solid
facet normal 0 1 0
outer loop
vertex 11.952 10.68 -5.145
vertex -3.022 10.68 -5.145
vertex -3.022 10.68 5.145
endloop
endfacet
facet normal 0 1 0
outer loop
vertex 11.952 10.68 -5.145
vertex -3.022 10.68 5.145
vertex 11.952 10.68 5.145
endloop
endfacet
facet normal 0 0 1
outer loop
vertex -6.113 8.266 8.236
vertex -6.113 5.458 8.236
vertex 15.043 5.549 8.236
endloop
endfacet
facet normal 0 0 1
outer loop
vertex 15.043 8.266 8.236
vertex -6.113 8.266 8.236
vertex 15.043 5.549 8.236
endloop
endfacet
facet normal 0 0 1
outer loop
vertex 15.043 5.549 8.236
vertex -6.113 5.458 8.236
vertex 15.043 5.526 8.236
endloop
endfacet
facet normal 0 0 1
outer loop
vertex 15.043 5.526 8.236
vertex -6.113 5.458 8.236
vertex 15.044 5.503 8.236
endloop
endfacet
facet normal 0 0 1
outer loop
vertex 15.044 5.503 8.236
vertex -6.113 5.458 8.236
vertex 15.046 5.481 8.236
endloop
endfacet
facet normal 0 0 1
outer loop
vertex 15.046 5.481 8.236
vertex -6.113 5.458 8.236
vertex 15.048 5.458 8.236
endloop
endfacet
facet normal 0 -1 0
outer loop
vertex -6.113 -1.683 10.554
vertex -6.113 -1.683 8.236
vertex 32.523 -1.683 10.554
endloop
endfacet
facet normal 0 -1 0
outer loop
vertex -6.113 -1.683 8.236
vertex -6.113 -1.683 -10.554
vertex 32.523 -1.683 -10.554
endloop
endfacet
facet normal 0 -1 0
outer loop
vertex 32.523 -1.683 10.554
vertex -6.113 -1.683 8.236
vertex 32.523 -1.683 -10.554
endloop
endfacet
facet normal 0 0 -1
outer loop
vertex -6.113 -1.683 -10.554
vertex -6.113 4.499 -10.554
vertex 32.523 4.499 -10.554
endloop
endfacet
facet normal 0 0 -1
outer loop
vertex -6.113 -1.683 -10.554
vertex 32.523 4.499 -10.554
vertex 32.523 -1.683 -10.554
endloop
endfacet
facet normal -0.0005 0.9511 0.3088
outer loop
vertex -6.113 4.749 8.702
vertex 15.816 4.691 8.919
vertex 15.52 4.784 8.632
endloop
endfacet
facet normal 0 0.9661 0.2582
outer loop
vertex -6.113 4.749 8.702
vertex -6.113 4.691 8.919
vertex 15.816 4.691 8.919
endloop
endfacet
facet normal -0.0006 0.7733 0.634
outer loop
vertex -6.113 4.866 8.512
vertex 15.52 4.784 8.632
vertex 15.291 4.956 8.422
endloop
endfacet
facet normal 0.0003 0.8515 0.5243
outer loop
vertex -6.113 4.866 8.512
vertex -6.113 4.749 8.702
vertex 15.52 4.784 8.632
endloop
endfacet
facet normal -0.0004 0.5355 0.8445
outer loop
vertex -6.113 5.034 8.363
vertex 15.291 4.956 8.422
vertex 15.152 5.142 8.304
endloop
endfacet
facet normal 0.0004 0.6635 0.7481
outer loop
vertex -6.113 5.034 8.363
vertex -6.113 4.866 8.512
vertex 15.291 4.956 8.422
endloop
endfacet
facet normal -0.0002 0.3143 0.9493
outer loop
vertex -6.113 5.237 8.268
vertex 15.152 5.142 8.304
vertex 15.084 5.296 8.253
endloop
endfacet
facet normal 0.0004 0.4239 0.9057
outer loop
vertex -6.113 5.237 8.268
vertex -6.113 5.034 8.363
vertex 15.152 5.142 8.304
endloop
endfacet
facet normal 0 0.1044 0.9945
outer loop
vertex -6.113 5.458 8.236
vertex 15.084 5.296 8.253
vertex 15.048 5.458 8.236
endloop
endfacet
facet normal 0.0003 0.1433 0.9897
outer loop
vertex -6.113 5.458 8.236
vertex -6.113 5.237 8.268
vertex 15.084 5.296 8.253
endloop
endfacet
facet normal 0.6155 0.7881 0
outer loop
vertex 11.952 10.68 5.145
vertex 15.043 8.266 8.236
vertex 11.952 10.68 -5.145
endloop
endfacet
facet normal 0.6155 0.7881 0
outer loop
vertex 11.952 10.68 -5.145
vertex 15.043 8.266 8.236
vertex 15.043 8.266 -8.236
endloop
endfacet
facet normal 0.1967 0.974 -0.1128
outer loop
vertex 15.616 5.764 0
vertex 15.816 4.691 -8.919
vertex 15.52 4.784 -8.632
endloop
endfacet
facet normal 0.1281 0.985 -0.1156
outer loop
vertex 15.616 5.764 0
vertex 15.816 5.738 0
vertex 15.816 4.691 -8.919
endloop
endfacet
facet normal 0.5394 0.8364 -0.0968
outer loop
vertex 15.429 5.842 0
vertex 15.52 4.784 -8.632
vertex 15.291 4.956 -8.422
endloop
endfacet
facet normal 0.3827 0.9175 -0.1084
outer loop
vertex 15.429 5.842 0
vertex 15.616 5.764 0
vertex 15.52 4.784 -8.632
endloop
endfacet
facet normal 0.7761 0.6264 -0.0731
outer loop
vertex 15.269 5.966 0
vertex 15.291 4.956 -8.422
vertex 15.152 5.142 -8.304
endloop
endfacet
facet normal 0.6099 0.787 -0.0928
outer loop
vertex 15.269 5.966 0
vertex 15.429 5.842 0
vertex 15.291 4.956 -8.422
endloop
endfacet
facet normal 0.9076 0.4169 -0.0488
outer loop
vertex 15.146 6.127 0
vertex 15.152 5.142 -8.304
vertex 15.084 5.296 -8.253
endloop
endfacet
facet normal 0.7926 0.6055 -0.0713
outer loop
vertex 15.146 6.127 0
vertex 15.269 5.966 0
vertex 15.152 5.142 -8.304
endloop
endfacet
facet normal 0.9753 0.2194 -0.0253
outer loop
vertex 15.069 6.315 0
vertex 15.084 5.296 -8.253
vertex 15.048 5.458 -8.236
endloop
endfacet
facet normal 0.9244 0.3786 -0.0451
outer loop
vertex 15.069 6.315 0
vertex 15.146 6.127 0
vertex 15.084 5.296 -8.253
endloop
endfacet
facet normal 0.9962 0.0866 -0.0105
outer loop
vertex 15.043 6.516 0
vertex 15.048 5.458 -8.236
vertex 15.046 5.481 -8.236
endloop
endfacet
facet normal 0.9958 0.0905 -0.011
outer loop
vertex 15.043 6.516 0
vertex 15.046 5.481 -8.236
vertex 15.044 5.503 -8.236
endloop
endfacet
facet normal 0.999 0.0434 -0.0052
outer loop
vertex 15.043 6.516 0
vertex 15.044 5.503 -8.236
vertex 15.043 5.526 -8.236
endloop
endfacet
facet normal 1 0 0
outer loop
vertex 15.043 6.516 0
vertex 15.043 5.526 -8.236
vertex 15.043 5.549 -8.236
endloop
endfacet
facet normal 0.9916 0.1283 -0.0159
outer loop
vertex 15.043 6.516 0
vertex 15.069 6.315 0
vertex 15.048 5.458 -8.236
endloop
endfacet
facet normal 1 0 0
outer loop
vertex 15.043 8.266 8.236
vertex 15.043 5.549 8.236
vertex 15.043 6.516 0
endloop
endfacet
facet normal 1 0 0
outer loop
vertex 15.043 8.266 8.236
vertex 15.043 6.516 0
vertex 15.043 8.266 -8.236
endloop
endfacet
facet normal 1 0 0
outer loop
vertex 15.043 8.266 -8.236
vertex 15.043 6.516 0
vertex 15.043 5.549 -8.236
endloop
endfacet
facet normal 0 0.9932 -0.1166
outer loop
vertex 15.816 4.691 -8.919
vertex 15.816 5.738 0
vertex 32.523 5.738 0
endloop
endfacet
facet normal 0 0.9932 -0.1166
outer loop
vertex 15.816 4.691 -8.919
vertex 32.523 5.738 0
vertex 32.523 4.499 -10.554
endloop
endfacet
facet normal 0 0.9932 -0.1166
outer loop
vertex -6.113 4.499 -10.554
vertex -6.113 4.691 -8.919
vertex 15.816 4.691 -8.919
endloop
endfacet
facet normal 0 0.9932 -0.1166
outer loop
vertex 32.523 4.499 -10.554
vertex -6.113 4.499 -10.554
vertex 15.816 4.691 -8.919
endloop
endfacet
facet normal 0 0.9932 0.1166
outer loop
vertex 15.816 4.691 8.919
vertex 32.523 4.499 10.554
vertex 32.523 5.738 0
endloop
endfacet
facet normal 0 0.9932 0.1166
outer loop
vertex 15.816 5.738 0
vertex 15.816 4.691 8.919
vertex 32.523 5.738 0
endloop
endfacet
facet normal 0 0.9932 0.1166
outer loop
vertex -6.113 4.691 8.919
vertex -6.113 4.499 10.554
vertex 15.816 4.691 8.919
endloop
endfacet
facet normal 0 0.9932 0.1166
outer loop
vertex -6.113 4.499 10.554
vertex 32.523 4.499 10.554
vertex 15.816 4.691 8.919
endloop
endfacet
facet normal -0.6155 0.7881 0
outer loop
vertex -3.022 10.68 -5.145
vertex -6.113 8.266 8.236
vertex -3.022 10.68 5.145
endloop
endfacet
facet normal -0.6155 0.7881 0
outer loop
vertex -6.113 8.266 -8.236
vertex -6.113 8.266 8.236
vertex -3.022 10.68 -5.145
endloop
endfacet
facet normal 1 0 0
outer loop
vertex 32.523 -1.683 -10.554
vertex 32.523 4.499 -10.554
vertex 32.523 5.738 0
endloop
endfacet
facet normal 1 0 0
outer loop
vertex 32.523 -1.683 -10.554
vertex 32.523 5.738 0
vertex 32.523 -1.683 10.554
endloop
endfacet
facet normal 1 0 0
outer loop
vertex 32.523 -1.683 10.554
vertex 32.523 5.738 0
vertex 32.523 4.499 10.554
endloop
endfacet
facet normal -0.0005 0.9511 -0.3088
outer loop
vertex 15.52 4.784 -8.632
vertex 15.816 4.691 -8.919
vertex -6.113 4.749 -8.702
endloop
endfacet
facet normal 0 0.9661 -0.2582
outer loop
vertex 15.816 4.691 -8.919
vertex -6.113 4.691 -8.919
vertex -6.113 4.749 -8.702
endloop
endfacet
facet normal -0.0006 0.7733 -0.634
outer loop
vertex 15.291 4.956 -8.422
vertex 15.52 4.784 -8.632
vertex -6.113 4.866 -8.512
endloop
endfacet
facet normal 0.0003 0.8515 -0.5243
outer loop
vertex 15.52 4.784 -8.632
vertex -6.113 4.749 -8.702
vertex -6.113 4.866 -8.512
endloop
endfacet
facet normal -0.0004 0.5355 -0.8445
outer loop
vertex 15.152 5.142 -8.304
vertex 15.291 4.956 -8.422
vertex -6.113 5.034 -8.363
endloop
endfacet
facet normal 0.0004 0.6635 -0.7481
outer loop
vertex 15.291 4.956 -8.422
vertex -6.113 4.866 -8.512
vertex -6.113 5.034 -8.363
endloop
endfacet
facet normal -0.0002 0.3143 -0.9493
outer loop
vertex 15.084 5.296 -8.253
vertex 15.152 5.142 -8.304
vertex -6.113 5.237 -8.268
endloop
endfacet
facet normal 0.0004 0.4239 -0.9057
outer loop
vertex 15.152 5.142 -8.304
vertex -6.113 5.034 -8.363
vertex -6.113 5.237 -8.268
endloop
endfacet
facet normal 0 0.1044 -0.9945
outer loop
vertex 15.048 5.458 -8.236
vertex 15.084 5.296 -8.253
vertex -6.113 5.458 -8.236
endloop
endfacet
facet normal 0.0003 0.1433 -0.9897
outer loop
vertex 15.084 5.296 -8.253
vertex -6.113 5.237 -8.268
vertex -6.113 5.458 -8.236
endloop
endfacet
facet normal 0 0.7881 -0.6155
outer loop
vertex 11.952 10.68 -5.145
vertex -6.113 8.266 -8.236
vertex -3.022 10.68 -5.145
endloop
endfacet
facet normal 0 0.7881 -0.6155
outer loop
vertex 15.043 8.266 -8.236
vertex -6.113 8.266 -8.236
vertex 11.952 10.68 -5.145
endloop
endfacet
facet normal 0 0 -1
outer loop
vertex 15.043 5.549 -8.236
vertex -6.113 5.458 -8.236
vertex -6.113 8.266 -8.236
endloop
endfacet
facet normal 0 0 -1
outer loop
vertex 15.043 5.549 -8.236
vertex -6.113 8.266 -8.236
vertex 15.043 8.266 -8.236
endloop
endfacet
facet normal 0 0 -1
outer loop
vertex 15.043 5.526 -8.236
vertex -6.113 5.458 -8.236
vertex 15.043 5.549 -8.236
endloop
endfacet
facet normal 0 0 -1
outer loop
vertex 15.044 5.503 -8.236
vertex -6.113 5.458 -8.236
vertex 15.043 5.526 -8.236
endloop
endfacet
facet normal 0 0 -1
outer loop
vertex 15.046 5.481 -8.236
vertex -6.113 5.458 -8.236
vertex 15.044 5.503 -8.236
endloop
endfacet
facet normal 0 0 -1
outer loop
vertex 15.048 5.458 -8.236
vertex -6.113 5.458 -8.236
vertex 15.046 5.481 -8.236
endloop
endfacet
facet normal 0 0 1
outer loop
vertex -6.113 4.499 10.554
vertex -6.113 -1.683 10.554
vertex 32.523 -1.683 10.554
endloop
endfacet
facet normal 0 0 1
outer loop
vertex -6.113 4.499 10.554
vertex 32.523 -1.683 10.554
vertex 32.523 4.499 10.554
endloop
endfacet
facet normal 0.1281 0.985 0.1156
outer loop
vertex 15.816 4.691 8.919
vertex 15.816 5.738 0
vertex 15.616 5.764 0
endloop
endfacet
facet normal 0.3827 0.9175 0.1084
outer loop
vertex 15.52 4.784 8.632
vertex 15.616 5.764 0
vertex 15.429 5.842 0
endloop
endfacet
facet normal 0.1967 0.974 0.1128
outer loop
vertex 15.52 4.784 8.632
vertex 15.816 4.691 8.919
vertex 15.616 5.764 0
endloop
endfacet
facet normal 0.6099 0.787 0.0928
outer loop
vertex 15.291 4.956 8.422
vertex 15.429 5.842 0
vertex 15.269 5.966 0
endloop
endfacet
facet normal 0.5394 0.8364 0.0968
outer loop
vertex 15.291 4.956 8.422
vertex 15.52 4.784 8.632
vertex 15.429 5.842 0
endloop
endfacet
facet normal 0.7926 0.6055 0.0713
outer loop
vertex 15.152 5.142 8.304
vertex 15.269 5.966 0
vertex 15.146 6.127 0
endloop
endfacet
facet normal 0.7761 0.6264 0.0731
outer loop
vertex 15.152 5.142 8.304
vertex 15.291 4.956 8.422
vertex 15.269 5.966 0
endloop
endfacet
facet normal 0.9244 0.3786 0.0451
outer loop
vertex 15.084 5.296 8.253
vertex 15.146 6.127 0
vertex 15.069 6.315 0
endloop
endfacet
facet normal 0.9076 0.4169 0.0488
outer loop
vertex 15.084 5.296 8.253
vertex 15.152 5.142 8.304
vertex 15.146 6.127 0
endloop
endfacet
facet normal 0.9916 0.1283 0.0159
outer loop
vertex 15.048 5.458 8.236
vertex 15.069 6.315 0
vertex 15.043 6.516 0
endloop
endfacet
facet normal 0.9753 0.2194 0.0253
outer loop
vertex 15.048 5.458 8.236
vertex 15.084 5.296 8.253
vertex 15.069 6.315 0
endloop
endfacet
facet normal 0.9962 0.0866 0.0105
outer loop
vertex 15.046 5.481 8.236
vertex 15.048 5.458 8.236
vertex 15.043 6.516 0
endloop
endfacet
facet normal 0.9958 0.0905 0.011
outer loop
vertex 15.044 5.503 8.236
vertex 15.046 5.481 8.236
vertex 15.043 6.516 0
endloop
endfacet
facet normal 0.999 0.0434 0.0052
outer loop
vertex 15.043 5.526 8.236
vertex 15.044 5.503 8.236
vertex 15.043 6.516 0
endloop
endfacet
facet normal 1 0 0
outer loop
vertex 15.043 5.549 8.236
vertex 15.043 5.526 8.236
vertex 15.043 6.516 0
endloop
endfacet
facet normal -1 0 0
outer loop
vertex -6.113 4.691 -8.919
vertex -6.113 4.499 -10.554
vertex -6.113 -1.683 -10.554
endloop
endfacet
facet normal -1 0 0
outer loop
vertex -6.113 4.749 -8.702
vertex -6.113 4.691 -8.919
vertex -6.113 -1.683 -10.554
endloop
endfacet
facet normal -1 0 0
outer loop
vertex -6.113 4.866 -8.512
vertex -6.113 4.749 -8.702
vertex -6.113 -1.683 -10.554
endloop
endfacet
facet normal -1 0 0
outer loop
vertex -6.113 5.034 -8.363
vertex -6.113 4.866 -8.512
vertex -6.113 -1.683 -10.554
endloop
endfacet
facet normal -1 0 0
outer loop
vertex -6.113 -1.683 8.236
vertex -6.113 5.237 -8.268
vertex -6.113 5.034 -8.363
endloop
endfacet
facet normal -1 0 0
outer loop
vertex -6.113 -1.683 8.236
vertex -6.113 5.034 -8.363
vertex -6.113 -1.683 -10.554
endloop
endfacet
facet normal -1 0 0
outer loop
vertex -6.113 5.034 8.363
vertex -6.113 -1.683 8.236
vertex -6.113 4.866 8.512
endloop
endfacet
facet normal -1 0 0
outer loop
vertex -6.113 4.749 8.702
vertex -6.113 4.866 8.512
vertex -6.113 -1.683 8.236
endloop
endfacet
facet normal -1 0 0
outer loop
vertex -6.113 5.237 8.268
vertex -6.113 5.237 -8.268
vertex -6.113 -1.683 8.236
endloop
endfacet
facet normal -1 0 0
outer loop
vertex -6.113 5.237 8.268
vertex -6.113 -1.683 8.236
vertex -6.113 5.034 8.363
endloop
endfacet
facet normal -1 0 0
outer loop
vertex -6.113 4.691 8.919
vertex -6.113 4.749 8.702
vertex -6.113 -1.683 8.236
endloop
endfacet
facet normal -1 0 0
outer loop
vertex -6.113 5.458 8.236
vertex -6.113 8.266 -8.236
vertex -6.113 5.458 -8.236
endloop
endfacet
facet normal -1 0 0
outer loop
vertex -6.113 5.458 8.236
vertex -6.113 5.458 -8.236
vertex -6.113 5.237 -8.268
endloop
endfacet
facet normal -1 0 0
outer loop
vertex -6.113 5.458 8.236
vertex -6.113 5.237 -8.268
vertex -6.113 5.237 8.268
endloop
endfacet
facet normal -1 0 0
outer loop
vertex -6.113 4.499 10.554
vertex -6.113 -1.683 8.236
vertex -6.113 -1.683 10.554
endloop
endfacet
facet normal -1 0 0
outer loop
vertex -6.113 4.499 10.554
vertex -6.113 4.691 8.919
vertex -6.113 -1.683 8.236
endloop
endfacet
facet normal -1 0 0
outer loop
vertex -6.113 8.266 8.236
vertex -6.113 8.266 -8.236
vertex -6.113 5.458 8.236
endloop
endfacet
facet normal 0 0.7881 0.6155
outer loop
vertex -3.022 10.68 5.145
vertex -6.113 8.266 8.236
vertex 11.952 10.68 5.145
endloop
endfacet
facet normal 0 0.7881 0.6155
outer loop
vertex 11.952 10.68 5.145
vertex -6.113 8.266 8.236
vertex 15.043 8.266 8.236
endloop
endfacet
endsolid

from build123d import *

# Parameters (mm, degrees)
SALIENTE_EXTRUIR1_DEPTH = 25
CROQUIS2_W              = 13.689149165
CROQUIS2_H              = 10.658244286
SALIENTE_EXTRUIR2_DEPTH = 8
REDONDEO1_R             = 0.5
CHAFL_N2_SIZE           = 2
CHAFL_N2_SIZE2          = 1.562571253
ESCALA2_SCALE           = 1.5
ESCALA3_SCALE           = 1.01
ESCALA4_SCALE           = 1.01
ESCALA5_SCALE           = 1.01


with BuildPart() as part:
    # Croquis1 → Saliente-Extruir1 (new body)
    with BuildSketch(Plane(origin=(0, 0, 0), x_dir=(0, 0, -1), z_dir=(1, 0, 0))):
        Polygon((6.829122143, 0), (-6.829122143, 0), (-6.829122143, 4), (0, 4.801857706), (6.829122143, 4), align=None)
    extrude(amount=SALIENTE_EXTRUIR1_DEPTH)

    # Croquis2 → Saliente-Extruir2 (add)
    with BuildSketch(Plane(origin=(0, 0, 0), x_dir=(1, 0, 0), z_dir=(0, 1, 0))):
        with Locations((6.844574583, 0)):
            Rectangle(CROQUIS2_W, CROQUIS2_H)
    extrude(amount=SALIENTE_EXTRUIR2_DEPTH)

    # Redondeo1
    redondeo1_edges = [part.edges().sort_by_distance(p)[0] for p in [
        (13.689149165, 4.488991896, 2.664561071),
        (13.689149165, 4.488991896, -2.664561071),
        (6.844574582, 4.176126087, 5.329122143),
        (6.844574582, 4.176126087, -5.329122143),
    ]]
    fillet(redondeo1_edges, radius=REDONDEO1_R)

    # Chaflán2
    chafl_n2_edges = [part.edges().sort_by_distance(p)[0] for p in [
        (0, 8, 0),
        (6.844574582, 8, 5.329122143),
        (13.689149165, 8, 0),
        (6.844574582, 8, -5.329122143),
    ]]
    chafl_n2_side = [part.faces().sort_by_distance(p)[0] for p in [
        (6.844574582, 8, 0),
    ]]
    chamfer(chafl_n2_edges, length=CHAFL_N2_SIZE, length2=CHAFL_N2_SIZE2, reference=chafl_n2_side[0])


with BuildPart() as part_1:
    # Escala2: scaled about (11.207296742, 3.085828341, 0)
    add(part.part.scale(ESCALA2_SCALE).moved(Location((-5.603648371, -1.542914171, 0))))


with BuildPart() as part_2:
    # Escala3: scaled about (11.207296743, 3.085828341, 0)
    add(part_1.part.scale(ESCALA3_SCALE).moved(Location((-0.112072967, -0.030858283, 0))))


with BuildPart() as part_3:
    # Escala4: scaled about (11.207296743, 3.085828341, 0)
    add(part_2.part.scale(ESCALA4_SCALE).moved(Location((-0.112072967, -0.030858283, 0))))


with BuildPart() as part_4:
    # Escala5: scaled about (11.207296743, 3.085828341, 0)
    add(part_3.part.scale(ESCALA5_SCALE).moved(Location((-0.112072967, -0.030858283, 0))))


solid = part_4.part
